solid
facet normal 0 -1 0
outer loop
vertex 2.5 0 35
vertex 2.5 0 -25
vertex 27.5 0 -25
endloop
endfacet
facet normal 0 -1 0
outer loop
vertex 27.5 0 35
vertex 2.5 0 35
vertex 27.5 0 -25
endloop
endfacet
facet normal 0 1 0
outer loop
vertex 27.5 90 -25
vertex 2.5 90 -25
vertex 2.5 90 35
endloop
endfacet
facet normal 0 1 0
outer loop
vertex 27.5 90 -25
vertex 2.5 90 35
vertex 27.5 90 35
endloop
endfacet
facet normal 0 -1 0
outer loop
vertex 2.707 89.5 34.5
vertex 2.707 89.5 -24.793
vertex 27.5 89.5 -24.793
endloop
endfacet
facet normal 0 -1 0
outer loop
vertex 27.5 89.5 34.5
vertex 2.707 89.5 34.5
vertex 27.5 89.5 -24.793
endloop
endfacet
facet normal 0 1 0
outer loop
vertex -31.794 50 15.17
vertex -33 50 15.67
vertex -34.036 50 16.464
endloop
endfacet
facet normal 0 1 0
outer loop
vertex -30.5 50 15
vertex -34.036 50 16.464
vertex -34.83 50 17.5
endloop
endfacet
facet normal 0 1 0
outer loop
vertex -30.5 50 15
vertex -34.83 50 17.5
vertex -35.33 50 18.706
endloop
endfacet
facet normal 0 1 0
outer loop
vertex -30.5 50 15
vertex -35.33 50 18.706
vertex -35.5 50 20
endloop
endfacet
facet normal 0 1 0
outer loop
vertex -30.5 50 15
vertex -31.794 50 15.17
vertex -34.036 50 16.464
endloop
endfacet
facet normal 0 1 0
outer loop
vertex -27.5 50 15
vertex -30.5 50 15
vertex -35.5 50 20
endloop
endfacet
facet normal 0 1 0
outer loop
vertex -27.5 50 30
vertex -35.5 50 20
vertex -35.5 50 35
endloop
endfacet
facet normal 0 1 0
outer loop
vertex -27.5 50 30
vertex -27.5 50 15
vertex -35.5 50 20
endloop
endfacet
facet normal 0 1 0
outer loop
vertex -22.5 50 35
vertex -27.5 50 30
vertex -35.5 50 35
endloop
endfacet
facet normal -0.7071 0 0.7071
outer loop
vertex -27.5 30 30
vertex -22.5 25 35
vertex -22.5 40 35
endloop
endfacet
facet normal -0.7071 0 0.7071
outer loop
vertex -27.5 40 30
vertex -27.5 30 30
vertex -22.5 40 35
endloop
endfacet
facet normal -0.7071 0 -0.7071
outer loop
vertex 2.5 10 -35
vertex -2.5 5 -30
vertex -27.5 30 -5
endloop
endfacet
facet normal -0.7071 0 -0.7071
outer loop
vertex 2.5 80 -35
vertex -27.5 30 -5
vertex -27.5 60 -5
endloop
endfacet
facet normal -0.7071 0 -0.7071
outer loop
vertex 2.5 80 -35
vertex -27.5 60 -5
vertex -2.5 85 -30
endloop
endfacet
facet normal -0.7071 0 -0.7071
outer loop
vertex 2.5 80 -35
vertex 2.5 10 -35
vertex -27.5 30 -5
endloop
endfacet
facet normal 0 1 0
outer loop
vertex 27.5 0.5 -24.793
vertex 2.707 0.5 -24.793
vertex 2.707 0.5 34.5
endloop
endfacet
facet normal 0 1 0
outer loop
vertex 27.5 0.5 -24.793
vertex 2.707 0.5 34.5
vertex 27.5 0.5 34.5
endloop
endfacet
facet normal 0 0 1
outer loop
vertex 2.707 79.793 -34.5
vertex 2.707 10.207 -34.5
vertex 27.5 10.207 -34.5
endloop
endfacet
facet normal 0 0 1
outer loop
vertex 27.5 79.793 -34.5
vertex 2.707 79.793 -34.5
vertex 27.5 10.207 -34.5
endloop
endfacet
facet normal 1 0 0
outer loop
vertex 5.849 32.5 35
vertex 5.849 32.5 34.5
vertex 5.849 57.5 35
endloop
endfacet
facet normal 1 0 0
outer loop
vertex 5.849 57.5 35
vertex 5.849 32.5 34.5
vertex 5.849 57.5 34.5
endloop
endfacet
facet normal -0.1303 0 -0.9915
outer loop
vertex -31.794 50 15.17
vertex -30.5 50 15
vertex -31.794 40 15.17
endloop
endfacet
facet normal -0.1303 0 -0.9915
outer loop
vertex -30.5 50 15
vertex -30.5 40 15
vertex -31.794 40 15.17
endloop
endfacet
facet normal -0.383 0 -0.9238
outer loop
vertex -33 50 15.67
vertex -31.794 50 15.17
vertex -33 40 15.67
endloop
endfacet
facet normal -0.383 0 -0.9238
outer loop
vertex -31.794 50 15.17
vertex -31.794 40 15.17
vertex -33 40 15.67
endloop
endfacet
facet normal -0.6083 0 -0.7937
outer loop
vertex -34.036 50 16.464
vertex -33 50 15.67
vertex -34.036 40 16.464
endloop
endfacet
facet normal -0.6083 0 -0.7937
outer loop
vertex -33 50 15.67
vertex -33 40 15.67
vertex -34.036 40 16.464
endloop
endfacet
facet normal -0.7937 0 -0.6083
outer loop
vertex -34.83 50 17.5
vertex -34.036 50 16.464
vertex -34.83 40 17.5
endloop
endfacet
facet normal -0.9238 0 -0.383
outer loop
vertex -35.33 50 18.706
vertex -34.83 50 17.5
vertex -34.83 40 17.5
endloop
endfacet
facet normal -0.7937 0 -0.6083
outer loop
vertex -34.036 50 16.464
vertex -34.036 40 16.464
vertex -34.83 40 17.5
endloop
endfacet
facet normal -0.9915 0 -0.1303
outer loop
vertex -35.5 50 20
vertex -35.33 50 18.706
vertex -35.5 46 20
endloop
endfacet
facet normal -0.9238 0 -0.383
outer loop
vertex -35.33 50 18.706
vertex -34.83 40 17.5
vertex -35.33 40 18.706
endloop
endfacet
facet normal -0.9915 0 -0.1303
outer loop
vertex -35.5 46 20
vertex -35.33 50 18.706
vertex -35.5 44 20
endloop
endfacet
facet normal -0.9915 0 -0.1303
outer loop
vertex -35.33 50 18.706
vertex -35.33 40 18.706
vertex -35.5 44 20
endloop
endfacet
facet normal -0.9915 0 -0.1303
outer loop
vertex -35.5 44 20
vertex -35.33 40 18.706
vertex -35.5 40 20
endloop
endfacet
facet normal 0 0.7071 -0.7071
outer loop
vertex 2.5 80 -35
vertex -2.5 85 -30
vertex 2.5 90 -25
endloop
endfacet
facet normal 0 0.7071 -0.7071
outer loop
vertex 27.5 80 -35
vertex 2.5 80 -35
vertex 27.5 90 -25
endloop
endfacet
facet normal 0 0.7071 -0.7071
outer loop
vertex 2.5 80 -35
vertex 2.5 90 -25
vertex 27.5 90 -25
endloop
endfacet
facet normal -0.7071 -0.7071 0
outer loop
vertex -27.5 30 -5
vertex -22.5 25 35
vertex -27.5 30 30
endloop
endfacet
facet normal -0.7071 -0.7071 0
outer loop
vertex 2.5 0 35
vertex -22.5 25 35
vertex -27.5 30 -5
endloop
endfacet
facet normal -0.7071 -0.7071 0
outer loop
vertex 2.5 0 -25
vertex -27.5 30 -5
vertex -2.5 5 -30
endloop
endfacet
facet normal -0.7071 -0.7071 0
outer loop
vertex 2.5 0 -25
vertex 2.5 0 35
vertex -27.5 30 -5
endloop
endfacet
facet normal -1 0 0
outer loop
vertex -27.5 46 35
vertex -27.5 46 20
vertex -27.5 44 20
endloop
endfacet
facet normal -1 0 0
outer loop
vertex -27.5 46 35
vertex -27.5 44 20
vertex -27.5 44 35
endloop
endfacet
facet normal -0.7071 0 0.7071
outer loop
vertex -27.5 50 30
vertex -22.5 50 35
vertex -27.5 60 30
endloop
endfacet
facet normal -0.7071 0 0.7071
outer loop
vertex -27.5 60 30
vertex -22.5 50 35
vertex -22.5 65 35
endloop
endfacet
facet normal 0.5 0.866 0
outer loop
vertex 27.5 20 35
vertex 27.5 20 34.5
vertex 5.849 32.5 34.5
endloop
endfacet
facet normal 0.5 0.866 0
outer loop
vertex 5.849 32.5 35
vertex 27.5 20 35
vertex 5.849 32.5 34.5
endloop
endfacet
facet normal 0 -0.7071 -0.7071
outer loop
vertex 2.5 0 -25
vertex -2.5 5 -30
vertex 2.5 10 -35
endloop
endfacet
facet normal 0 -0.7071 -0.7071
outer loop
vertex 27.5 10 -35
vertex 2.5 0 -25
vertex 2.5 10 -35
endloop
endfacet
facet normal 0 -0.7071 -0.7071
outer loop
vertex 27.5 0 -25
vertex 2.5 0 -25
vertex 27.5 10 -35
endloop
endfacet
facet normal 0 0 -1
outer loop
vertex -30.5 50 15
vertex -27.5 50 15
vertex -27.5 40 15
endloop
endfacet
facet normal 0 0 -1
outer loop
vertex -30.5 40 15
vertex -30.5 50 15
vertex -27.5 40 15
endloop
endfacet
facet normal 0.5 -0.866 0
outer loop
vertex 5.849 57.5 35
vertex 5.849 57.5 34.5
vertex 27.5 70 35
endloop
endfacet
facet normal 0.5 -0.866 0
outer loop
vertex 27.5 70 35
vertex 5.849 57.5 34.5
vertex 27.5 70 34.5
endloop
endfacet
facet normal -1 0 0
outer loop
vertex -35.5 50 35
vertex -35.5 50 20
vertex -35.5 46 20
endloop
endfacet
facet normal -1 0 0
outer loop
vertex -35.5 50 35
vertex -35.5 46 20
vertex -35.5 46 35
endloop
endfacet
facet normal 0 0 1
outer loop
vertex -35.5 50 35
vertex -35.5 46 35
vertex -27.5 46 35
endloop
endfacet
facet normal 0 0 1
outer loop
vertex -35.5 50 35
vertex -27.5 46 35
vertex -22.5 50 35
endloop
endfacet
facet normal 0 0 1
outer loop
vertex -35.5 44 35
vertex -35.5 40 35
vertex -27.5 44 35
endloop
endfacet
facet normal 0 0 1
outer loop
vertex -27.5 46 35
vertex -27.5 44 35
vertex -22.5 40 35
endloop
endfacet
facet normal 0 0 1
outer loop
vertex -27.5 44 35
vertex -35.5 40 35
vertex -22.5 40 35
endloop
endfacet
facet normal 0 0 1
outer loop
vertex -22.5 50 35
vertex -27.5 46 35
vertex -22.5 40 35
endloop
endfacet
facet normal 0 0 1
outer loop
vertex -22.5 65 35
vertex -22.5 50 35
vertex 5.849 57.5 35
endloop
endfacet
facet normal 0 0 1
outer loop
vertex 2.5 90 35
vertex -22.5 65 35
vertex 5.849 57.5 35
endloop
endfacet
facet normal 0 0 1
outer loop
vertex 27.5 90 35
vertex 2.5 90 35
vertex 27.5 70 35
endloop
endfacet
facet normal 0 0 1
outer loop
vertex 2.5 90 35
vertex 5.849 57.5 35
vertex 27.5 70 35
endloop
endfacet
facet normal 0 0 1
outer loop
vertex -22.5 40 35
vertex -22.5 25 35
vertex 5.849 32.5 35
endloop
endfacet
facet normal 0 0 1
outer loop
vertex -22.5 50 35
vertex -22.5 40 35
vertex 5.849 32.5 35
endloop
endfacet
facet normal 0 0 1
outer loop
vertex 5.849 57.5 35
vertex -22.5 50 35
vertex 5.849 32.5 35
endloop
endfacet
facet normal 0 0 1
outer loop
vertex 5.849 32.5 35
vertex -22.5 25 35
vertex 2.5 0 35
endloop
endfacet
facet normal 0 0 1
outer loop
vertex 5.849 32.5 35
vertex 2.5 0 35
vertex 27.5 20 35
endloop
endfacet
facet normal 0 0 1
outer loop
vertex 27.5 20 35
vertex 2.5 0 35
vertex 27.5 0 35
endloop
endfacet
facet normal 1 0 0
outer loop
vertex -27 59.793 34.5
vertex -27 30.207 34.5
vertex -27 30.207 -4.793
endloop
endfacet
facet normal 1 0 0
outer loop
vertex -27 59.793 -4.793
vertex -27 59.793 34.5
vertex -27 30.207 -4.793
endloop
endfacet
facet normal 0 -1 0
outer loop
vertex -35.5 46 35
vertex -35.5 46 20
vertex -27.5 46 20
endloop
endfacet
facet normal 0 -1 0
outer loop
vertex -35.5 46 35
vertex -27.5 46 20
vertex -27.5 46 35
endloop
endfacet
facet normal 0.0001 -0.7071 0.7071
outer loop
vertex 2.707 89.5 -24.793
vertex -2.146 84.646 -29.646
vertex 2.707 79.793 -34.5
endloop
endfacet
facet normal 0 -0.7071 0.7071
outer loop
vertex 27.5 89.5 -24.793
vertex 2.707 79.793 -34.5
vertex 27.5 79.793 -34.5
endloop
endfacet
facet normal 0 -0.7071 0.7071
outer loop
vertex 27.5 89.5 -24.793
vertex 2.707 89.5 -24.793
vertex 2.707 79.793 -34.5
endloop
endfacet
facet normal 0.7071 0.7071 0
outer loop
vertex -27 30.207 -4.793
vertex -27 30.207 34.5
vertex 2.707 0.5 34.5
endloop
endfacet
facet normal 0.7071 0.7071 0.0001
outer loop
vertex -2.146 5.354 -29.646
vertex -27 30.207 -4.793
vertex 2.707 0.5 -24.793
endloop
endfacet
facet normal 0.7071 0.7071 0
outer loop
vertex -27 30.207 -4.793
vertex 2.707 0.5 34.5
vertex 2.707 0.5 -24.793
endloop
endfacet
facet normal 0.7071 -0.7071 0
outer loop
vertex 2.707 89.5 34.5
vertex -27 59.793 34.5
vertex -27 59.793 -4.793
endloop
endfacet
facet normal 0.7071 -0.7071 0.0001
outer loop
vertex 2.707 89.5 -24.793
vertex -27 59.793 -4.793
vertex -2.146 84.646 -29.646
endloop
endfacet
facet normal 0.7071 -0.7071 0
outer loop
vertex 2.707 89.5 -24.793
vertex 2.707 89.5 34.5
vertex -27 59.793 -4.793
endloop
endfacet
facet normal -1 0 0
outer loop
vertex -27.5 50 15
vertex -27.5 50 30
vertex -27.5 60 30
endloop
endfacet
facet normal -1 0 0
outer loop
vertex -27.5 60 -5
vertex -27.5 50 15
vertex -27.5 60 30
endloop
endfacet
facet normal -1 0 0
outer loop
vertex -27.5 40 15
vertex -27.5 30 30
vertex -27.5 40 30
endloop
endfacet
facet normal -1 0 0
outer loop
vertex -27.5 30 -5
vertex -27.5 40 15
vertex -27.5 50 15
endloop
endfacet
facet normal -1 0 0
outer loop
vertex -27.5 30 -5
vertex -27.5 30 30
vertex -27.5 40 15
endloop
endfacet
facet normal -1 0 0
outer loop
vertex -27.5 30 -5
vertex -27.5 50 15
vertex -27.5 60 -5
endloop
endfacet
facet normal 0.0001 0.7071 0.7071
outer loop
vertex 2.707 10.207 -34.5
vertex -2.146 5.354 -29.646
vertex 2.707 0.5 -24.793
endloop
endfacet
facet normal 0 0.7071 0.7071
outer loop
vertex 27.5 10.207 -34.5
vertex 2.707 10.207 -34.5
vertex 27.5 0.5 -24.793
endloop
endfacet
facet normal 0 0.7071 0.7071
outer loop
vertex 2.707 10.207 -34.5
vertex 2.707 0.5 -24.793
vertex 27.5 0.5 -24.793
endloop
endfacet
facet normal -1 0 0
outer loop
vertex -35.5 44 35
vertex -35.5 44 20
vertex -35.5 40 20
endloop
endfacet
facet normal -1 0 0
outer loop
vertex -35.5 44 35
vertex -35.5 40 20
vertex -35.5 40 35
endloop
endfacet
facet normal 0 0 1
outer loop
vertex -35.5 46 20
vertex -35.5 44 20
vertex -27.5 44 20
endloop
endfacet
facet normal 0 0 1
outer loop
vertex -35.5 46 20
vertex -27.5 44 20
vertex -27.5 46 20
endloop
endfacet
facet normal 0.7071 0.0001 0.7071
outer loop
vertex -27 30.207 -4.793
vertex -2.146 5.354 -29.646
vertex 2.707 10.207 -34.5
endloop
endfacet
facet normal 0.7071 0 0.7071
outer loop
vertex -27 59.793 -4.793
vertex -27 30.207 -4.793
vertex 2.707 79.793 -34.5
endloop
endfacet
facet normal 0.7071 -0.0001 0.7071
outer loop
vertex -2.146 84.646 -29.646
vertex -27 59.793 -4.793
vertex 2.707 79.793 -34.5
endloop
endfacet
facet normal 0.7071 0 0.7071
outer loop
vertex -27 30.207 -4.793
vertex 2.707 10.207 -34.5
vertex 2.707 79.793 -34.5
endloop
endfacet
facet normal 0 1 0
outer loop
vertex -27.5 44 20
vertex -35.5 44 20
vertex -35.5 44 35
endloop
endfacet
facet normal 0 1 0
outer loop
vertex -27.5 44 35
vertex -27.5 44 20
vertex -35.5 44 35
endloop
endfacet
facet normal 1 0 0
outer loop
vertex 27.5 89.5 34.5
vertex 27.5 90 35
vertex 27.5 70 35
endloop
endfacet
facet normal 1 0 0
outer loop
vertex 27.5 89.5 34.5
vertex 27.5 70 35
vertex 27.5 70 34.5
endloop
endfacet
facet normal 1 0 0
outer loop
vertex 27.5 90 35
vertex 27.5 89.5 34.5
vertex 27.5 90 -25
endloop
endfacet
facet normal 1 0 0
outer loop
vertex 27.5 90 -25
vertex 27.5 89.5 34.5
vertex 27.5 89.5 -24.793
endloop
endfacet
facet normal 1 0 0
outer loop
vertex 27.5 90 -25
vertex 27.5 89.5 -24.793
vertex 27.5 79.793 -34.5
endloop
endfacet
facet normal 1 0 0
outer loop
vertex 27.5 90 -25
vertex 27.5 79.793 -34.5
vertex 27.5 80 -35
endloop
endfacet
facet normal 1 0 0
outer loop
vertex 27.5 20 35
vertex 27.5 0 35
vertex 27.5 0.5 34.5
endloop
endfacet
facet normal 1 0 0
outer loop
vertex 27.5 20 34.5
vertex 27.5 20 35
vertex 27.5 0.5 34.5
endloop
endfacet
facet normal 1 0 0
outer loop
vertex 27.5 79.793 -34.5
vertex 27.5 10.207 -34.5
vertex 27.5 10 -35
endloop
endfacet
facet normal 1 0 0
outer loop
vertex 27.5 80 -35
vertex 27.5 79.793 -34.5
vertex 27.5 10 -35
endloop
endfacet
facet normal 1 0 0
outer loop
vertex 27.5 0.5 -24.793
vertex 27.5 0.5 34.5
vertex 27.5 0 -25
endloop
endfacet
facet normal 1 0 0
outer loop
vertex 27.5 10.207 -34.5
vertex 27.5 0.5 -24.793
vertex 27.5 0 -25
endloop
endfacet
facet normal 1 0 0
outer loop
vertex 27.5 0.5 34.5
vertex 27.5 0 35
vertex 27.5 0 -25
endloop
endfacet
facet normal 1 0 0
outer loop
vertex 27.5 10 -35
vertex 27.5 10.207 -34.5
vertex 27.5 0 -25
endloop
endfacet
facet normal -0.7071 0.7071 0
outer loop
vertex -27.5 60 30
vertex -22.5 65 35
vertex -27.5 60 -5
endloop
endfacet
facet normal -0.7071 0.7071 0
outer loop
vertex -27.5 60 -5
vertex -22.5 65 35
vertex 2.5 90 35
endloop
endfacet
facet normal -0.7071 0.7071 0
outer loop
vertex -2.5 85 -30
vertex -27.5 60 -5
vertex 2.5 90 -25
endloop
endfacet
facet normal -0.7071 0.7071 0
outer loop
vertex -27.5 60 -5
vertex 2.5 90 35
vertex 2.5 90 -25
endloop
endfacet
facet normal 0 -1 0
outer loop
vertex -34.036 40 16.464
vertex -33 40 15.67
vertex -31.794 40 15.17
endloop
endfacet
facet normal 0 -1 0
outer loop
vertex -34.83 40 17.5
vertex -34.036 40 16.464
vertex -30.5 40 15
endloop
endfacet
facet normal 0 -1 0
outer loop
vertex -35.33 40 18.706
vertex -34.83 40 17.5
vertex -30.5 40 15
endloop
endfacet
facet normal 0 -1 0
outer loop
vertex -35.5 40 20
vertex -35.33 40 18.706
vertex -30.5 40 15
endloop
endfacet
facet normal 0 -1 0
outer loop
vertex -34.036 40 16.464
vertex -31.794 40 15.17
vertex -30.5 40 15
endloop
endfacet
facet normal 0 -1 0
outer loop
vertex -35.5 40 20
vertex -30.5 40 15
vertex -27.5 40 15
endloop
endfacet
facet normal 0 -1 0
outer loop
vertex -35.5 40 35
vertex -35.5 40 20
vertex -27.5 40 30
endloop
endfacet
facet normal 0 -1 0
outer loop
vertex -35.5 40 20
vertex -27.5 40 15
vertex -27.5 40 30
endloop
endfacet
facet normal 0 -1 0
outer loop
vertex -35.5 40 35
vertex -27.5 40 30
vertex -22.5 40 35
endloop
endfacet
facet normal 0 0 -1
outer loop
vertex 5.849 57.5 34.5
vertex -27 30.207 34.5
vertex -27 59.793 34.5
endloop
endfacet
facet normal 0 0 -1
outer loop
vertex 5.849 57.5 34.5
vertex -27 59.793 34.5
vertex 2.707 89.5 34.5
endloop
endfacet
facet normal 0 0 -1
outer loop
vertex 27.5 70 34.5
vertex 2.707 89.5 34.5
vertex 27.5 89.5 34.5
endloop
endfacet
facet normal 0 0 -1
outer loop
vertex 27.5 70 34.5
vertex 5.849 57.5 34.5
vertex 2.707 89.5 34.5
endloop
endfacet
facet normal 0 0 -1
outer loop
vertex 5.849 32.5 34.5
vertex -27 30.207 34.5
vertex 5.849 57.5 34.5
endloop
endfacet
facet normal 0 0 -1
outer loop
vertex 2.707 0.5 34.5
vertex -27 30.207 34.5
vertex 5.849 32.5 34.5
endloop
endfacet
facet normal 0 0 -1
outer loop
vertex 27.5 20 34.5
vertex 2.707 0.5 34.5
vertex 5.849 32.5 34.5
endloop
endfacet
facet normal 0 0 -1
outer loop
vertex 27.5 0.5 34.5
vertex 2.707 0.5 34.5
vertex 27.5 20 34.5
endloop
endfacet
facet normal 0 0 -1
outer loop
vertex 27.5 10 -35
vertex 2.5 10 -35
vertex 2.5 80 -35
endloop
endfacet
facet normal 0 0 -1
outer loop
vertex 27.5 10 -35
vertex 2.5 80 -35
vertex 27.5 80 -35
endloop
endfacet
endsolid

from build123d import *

# Parameters (mm, degrees)
SKETCH1_W           = 55
SKETCH1_H           = 70
BOSS_EXTRUDE1_DEPTH = 90
CHAMFER1_SIZE       = 30
CHAMFER2_SIZE       = 30
CHAMFER3_SIZE       = 10
SHELL1_T            = -0.5
SKETCH2_W           = 20
SKETCH2_H           = 5
BOSS_EXTRUDE2_DEPTH = 8
FILLET1_R           = 5
SKETCH3_W           = 30
SKETCH3_H           = 2
CUT_EXTRUDE1_DEPTH  = 8
CHAMFER5_SIZE       = 5
CUT_EXTRUDE2_DEPTH  = 5


with BuildPart() as part:
    # Sketch1 → Boss-Extrude1 (new body)
    with BuildSketch(Plane(origin=(0, 0, 0), x_dir=(1, 0, 0), z_dir=(0, 1, 0))):
        Rectangle(SKETCH1_W, SKETCH1_H)
    extrude(amount=BOSS_EXTRUDE1_DEPTH)

    # Chamfer1
    chamfer1_edges = [part.edges().sort_by_distance(p)[0] for p in [
        (-27.5, 45, -35),
    ]]
    chamfer(chamfer1_edges, length=CHAMFER1_SIZE)

    # Chamfer2
    chamfer2_edges = [part.edges().sort_by_distance(p)[0] for p in [
        (-27.5, 0, 15),
        (-27.5, 90, 15),
    ]]
    chamfer(chamfer2_edges, length=CHAMFER2_SIZE)

    # Chamfer3
    chamfer3_edges = [part.edges().sort_by_distance(p)[0] for p in [
        (15, 0, -35),
        (15, 90, -35),
    ]]
    chamfer(chamfer3_edges, length=CHAMFER3_SIZE)

    # Shell1
    shell1_openings = [part.faces().sort_by_distance(p)[0] for p in [
        (27.5, 45, 0.510752688),
    ]]
    offset(amount=SHELL1_T, openings=shell1_openings, kind=Kind.INTERSECTION)

    # Sketch2 → Boss-Extrude2 (add)
    with BuildSketch(Plane.ZY.offset(27.5)):
        with Locations((25, 47.5)):
            Rectangle(SKETCH2_W, SKETCH2_H)
        with Locations((25, 42.5)):
            Rectangle(SKETCH2_W, SKETCH2_H)
    extrude(amount=BOSS_EXTRUDE2_DEPTH)

    # Fillet1
    fillet1_edges = [part.edges().sort_by_distance(p)[0] for p in [
        (-35.5, 45, 15),
    ]]
    fillet(fillet1_edges, radius=FILLET1_R)

    # Sketch3 → Cut-Extrude1 (cut)
    with BuildSketch(Plane.ZY.offset(35.5)):
        with Locations((35, 45)):
            Rectangle(SKETCH3_W, SKETCH3_H)
    extrude(amount=-CUT_EXTRUDE1_DEPTH, mode=Mode.SUBTRACT)

    # Chamfer5
    chamfer5_edges = [part.edges().sort_by_distance(p)[0] for p in [
        (-27.5, 55, 35),
        (-27.5, 35, 35),
    ]]
    chamfer(chamfer5_edges, length=CHAMFER5_SIZE)

    # Sketch4 → Cut-Extrude2 (cut, symmetric)
    with BuildSketch(Plane(origin=(0, 0, 34.5), x_dir=(-1, 0, 0), z_dir=(0, 0, -1))):
        Polygon((-27.5, 70), (-49.150635095, 57.5), (-49.150635095, 32.5), (-27.5, 20), (-5.849364905, 32.5), (-5.849364905, 57.5), align=None)
    extrude(amount=CUT_EXTRUDE2_DEPTH, both=True, mode=Mode.SUBTRACT)


solid = part.part
